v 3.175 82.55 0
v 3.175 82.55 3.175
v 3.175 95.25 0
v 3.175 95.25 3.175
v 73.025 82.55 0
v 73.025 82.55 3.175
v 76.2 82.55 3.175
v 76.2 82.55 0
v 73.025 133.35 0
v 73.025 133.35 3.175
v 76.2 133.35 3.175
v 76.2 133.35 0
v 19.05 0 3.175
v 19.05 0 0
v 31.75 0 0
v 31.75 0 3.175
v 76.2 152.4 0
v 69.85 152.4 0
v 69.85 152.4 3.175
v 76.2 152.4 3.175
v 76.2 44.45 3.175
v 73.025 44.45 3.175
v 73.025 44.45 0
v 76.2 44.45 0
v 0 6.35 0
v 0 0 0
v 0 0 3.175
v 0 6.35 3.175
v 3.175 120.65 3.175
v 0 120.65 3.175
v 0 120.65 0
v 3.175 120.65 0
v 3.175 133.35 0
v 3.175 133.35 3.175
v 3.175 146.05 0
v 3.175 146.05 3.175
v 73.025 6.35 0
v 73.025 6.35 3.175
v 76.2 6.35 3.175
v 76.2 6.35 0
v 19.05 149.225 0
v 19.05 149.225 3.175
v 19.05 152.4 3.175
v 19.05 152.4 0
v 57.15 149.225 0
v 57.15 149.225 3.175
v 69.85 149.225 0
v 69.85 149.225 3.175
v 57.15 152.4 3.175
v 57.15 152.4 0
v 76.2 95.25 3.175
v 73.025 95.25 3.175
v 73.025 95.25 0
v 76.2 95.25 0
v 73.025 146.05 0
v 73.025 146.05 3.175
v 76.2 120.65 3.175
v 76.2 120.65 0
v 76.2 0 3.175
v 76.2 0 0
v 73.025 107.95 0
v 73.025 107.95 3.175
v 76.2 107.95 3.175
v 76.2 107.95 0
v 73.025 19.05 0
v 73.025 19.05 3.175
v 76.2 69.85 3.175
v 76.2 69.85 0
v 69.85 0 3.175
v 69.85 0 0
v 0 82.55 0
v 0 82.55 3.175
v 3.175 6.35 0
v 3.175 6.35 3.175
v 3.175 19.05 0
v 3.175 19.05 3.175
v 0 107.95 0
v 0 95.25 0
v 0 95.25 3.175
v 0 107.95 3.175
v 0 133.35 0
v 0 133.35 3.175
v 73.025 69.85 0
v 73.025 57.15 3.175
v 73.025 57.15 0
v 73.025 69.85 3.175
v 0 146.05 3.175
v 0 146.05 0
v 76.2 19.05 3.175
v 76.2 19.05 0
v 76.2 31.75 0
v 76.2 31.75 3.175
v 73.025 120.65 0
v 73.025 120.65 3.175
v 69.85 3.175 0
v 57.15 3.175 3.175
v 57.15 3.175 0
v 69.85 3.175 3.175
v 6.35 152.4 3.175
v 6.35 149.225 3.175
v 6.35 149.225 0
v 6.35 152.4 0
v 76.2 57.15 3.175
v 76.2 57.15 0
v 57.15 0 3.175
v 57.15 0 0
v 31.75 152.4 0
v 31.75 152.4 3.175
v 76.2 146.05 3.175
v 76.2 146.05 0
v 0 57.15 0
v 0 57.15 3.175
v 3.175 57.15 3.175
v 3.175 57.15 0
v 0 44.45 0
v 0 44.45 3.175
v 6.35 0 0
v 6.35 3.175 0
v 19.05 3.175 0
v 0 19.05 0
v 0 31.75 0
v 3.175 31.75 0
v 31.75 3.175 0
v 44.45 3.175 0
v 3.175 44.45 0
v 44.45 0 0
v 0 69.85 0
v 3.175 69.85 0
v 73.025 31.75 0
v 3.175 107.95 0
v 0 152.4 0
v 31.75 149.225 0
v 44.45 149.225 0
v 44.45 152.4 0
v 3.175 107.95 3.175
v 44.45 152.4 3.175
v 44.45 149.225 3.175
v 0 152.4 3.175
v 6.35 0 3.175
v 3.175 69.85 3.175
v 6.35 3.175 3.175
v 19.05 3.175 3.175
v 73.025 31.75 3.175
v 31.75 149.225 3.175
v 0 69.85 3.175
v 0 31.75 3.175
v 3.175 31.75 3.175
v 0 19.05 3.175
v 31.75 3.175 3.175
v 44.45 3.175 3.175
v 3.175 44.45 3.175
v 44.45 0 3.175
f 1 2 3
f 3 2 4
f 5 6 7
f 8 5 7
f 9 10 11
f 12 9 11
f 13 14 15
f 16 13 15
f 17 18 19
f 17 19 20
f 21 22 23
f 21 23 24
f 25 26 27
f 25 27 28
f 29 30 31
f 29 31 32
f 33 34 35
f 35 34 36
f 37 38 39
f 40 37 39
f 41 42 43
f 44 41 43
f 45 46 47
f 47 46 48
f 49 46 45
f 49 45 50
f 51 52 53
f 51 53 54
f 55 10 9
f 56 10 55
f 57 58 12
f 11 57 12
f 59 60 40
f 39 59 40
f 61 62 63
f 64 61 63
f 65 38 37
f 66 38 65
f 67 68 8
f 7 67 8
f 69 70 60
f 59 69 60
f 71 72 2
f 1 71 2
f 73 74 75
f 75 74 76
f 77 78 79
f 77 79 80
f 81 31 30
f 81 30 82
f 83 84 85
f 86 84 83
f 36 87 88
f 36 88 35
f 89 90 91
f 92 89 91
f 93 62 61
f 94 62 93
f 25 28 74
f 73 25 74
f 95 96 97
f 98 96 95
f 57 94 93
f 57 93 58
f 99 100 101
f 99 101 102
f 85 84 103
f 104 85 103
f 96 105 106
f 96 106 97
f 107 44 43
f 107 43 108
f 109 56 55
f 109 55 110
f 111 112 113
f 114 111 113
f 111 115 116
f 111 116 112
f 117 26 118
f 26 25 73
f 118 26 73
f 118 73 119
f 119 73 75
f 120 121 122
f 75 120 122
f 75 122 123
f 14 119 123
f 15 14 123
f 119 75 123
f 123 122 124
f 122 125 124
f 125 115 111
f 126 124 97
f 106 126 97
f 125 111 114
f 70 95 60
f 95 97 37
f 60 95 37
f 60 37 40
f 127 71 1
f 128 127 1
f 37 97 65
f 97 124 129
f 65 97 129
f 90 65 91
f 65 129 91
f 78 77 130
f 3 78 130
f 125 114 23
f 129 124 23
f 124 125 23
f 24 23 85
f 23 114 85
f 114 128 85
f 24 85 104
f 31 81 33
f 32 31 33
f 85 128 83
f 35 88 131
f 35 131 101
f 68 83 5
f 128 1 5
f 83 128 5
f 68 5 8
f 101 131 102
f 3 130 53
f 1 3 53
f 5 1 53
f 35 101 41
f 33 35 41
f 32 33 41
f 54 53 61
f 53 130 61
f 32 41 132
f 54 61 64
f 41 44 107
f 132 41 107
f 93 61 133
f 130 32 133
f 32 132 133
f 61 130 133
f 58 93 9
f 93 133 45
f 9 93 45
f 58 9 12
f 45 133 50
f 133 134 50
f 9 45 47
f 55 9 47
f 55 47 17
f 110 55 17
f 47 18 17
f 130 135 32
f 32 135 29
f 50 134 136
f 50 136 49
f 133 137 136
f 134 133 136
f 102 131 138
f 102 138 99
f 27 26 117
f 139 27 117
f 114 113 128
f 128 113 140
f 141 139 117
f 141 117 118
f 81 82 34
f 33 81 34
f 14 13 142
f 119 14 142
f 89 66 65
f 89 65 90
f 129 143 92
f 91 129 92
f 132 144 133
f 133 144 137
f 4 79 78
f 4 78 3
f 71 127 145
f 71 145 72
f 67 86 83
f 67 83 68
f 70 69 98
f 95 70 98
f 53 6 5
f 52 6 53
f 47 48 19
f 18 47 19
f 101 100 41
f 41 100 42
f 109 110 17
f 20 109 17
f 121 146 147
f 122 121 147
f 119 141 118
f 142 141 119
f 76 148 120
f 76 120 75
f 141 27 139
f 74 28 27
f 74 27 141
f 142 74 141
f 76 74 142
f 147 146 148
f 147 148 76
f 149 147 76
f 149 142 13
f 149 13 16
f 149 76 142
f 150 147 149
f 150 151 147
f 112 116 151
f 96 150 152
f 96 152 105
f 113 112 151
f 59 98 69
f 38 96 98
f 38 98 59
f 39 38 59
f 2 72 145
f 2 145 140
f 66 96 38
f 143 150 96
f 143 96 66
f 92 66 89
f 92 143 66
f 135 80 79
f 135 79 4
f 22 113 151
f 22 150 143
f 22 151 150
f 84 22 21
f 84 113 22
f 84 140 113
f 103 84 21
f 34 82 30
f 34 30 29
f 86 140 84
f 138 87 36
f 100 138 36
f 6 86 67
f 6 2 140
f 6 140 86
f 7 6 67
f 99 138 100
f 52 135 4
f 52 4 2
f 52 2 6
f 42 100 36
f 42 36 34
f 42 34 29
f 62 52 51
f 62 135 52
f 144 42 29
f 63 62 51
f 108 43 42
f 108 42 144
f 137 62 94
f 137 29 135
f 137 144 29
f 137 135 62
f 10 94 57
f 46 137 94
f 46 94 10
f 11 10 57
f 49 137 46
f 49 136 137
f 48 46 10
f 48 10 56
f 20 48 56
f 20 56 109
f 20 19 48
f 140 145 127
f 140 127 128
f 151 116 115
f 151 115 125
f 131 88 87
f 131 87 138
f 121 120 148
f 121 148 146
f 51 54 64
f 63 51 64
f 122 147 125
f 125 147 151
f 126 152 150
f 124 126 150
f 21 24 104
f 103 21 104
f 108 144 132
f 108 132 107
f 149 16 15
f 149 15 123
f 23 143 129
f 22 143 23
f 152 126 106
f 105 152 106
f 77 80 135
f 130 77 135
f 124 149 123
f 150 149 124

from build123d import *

# Parameters (mm, degrees)
SKETCH1_W            = 76.2
SKETCH1_H            = 152.4
EXTRUDE1_DEPTH       = 3.175
SKETCH3_W            = 3.175
SKETCH3_H            = 12.7
CUT_EXTRUDE1_DEPTH   = 3.175
LPATTERN1_COUNT      = 6
LPATTERN1_PITCH      = 25.4
LPATTERN1_COUNT_DIR2 = 2
LPATTERN1_PITCH_DIR2 = 73.025
SKETCH4_W            = 12.7
SKETCH4_H            = 3.175
CUT_EXTRUDE2_DEPTH   = 3.175
LPATTERN2_COUNT      = 3
LPATTERN2_PITCH      = 25.4
LPATTERN2_COUNT_DIR2 = 2
LPATTERN2_PITCH_DIR2 = 149.225


with BuildPart() as part:
    # Sketch1 → Extrude1 (new body)
    with BuildSketch(Plane.XY):
        with Locations((38.1, 76.2)):
            Rectangle(SKETCH1_W, SKETCH1_H)
    extrude(amount=EXTRUDE1_DEPTH)

    # Sketch3 → Cut-Extrude1 (cut)
    with BuildSketch(Plane.XY.offset(3.175)):
        with Locations((74.6125, 139.7)):
            Rectangle(SKETCH3_W, SKETCH3_H)
    cut_extrude1 = extrude(amount=-CUT_EXTRUDE1_DEPTH, mode=Mode.SUBTRACT)

    # LPattern1: Cut-Extrude1 6 × 2
    with Locations(*[(-j * LPATTERN1_PITCH_DIR2, -i * LPATTERN1_PITCH, 0) for i in range(LPATTERN1_COUNT) for j in range(LPATTERN1_COUNT_DIR2) if (i, j) != (0, 0)]):
        add(cut_extrude1, mode=Mode.SUBTRACT)

    # Sketch4 → Cut-Extrude2 (cut)
    with BuildSketch(Plane.XY.offset(3.175)):
        with Locations((63.5, 150.8125)):
            Rectangle(SKETCH4_W, SKETCH4_H)
    cut_extrude2 = extrude(amount=-CUT_EXTRUDE2_DEPTH, mode=Mode.SUBTRACT)

    # LPattern2: Cut-Extrude2 3 × 2
    with Locations(*[(-i * LPATTERN2_PITCH, -j * LPATTERN2_PITCH_DIR2, 0) for i in range(LPATTERN2_COUNT) for j in range(LPATTERN2_COUNT_DIR2) if (i, j) != (0, 0)]):
        add(cut_extrude2, mode=Mode.SUBTRACT)


solid = part.part
